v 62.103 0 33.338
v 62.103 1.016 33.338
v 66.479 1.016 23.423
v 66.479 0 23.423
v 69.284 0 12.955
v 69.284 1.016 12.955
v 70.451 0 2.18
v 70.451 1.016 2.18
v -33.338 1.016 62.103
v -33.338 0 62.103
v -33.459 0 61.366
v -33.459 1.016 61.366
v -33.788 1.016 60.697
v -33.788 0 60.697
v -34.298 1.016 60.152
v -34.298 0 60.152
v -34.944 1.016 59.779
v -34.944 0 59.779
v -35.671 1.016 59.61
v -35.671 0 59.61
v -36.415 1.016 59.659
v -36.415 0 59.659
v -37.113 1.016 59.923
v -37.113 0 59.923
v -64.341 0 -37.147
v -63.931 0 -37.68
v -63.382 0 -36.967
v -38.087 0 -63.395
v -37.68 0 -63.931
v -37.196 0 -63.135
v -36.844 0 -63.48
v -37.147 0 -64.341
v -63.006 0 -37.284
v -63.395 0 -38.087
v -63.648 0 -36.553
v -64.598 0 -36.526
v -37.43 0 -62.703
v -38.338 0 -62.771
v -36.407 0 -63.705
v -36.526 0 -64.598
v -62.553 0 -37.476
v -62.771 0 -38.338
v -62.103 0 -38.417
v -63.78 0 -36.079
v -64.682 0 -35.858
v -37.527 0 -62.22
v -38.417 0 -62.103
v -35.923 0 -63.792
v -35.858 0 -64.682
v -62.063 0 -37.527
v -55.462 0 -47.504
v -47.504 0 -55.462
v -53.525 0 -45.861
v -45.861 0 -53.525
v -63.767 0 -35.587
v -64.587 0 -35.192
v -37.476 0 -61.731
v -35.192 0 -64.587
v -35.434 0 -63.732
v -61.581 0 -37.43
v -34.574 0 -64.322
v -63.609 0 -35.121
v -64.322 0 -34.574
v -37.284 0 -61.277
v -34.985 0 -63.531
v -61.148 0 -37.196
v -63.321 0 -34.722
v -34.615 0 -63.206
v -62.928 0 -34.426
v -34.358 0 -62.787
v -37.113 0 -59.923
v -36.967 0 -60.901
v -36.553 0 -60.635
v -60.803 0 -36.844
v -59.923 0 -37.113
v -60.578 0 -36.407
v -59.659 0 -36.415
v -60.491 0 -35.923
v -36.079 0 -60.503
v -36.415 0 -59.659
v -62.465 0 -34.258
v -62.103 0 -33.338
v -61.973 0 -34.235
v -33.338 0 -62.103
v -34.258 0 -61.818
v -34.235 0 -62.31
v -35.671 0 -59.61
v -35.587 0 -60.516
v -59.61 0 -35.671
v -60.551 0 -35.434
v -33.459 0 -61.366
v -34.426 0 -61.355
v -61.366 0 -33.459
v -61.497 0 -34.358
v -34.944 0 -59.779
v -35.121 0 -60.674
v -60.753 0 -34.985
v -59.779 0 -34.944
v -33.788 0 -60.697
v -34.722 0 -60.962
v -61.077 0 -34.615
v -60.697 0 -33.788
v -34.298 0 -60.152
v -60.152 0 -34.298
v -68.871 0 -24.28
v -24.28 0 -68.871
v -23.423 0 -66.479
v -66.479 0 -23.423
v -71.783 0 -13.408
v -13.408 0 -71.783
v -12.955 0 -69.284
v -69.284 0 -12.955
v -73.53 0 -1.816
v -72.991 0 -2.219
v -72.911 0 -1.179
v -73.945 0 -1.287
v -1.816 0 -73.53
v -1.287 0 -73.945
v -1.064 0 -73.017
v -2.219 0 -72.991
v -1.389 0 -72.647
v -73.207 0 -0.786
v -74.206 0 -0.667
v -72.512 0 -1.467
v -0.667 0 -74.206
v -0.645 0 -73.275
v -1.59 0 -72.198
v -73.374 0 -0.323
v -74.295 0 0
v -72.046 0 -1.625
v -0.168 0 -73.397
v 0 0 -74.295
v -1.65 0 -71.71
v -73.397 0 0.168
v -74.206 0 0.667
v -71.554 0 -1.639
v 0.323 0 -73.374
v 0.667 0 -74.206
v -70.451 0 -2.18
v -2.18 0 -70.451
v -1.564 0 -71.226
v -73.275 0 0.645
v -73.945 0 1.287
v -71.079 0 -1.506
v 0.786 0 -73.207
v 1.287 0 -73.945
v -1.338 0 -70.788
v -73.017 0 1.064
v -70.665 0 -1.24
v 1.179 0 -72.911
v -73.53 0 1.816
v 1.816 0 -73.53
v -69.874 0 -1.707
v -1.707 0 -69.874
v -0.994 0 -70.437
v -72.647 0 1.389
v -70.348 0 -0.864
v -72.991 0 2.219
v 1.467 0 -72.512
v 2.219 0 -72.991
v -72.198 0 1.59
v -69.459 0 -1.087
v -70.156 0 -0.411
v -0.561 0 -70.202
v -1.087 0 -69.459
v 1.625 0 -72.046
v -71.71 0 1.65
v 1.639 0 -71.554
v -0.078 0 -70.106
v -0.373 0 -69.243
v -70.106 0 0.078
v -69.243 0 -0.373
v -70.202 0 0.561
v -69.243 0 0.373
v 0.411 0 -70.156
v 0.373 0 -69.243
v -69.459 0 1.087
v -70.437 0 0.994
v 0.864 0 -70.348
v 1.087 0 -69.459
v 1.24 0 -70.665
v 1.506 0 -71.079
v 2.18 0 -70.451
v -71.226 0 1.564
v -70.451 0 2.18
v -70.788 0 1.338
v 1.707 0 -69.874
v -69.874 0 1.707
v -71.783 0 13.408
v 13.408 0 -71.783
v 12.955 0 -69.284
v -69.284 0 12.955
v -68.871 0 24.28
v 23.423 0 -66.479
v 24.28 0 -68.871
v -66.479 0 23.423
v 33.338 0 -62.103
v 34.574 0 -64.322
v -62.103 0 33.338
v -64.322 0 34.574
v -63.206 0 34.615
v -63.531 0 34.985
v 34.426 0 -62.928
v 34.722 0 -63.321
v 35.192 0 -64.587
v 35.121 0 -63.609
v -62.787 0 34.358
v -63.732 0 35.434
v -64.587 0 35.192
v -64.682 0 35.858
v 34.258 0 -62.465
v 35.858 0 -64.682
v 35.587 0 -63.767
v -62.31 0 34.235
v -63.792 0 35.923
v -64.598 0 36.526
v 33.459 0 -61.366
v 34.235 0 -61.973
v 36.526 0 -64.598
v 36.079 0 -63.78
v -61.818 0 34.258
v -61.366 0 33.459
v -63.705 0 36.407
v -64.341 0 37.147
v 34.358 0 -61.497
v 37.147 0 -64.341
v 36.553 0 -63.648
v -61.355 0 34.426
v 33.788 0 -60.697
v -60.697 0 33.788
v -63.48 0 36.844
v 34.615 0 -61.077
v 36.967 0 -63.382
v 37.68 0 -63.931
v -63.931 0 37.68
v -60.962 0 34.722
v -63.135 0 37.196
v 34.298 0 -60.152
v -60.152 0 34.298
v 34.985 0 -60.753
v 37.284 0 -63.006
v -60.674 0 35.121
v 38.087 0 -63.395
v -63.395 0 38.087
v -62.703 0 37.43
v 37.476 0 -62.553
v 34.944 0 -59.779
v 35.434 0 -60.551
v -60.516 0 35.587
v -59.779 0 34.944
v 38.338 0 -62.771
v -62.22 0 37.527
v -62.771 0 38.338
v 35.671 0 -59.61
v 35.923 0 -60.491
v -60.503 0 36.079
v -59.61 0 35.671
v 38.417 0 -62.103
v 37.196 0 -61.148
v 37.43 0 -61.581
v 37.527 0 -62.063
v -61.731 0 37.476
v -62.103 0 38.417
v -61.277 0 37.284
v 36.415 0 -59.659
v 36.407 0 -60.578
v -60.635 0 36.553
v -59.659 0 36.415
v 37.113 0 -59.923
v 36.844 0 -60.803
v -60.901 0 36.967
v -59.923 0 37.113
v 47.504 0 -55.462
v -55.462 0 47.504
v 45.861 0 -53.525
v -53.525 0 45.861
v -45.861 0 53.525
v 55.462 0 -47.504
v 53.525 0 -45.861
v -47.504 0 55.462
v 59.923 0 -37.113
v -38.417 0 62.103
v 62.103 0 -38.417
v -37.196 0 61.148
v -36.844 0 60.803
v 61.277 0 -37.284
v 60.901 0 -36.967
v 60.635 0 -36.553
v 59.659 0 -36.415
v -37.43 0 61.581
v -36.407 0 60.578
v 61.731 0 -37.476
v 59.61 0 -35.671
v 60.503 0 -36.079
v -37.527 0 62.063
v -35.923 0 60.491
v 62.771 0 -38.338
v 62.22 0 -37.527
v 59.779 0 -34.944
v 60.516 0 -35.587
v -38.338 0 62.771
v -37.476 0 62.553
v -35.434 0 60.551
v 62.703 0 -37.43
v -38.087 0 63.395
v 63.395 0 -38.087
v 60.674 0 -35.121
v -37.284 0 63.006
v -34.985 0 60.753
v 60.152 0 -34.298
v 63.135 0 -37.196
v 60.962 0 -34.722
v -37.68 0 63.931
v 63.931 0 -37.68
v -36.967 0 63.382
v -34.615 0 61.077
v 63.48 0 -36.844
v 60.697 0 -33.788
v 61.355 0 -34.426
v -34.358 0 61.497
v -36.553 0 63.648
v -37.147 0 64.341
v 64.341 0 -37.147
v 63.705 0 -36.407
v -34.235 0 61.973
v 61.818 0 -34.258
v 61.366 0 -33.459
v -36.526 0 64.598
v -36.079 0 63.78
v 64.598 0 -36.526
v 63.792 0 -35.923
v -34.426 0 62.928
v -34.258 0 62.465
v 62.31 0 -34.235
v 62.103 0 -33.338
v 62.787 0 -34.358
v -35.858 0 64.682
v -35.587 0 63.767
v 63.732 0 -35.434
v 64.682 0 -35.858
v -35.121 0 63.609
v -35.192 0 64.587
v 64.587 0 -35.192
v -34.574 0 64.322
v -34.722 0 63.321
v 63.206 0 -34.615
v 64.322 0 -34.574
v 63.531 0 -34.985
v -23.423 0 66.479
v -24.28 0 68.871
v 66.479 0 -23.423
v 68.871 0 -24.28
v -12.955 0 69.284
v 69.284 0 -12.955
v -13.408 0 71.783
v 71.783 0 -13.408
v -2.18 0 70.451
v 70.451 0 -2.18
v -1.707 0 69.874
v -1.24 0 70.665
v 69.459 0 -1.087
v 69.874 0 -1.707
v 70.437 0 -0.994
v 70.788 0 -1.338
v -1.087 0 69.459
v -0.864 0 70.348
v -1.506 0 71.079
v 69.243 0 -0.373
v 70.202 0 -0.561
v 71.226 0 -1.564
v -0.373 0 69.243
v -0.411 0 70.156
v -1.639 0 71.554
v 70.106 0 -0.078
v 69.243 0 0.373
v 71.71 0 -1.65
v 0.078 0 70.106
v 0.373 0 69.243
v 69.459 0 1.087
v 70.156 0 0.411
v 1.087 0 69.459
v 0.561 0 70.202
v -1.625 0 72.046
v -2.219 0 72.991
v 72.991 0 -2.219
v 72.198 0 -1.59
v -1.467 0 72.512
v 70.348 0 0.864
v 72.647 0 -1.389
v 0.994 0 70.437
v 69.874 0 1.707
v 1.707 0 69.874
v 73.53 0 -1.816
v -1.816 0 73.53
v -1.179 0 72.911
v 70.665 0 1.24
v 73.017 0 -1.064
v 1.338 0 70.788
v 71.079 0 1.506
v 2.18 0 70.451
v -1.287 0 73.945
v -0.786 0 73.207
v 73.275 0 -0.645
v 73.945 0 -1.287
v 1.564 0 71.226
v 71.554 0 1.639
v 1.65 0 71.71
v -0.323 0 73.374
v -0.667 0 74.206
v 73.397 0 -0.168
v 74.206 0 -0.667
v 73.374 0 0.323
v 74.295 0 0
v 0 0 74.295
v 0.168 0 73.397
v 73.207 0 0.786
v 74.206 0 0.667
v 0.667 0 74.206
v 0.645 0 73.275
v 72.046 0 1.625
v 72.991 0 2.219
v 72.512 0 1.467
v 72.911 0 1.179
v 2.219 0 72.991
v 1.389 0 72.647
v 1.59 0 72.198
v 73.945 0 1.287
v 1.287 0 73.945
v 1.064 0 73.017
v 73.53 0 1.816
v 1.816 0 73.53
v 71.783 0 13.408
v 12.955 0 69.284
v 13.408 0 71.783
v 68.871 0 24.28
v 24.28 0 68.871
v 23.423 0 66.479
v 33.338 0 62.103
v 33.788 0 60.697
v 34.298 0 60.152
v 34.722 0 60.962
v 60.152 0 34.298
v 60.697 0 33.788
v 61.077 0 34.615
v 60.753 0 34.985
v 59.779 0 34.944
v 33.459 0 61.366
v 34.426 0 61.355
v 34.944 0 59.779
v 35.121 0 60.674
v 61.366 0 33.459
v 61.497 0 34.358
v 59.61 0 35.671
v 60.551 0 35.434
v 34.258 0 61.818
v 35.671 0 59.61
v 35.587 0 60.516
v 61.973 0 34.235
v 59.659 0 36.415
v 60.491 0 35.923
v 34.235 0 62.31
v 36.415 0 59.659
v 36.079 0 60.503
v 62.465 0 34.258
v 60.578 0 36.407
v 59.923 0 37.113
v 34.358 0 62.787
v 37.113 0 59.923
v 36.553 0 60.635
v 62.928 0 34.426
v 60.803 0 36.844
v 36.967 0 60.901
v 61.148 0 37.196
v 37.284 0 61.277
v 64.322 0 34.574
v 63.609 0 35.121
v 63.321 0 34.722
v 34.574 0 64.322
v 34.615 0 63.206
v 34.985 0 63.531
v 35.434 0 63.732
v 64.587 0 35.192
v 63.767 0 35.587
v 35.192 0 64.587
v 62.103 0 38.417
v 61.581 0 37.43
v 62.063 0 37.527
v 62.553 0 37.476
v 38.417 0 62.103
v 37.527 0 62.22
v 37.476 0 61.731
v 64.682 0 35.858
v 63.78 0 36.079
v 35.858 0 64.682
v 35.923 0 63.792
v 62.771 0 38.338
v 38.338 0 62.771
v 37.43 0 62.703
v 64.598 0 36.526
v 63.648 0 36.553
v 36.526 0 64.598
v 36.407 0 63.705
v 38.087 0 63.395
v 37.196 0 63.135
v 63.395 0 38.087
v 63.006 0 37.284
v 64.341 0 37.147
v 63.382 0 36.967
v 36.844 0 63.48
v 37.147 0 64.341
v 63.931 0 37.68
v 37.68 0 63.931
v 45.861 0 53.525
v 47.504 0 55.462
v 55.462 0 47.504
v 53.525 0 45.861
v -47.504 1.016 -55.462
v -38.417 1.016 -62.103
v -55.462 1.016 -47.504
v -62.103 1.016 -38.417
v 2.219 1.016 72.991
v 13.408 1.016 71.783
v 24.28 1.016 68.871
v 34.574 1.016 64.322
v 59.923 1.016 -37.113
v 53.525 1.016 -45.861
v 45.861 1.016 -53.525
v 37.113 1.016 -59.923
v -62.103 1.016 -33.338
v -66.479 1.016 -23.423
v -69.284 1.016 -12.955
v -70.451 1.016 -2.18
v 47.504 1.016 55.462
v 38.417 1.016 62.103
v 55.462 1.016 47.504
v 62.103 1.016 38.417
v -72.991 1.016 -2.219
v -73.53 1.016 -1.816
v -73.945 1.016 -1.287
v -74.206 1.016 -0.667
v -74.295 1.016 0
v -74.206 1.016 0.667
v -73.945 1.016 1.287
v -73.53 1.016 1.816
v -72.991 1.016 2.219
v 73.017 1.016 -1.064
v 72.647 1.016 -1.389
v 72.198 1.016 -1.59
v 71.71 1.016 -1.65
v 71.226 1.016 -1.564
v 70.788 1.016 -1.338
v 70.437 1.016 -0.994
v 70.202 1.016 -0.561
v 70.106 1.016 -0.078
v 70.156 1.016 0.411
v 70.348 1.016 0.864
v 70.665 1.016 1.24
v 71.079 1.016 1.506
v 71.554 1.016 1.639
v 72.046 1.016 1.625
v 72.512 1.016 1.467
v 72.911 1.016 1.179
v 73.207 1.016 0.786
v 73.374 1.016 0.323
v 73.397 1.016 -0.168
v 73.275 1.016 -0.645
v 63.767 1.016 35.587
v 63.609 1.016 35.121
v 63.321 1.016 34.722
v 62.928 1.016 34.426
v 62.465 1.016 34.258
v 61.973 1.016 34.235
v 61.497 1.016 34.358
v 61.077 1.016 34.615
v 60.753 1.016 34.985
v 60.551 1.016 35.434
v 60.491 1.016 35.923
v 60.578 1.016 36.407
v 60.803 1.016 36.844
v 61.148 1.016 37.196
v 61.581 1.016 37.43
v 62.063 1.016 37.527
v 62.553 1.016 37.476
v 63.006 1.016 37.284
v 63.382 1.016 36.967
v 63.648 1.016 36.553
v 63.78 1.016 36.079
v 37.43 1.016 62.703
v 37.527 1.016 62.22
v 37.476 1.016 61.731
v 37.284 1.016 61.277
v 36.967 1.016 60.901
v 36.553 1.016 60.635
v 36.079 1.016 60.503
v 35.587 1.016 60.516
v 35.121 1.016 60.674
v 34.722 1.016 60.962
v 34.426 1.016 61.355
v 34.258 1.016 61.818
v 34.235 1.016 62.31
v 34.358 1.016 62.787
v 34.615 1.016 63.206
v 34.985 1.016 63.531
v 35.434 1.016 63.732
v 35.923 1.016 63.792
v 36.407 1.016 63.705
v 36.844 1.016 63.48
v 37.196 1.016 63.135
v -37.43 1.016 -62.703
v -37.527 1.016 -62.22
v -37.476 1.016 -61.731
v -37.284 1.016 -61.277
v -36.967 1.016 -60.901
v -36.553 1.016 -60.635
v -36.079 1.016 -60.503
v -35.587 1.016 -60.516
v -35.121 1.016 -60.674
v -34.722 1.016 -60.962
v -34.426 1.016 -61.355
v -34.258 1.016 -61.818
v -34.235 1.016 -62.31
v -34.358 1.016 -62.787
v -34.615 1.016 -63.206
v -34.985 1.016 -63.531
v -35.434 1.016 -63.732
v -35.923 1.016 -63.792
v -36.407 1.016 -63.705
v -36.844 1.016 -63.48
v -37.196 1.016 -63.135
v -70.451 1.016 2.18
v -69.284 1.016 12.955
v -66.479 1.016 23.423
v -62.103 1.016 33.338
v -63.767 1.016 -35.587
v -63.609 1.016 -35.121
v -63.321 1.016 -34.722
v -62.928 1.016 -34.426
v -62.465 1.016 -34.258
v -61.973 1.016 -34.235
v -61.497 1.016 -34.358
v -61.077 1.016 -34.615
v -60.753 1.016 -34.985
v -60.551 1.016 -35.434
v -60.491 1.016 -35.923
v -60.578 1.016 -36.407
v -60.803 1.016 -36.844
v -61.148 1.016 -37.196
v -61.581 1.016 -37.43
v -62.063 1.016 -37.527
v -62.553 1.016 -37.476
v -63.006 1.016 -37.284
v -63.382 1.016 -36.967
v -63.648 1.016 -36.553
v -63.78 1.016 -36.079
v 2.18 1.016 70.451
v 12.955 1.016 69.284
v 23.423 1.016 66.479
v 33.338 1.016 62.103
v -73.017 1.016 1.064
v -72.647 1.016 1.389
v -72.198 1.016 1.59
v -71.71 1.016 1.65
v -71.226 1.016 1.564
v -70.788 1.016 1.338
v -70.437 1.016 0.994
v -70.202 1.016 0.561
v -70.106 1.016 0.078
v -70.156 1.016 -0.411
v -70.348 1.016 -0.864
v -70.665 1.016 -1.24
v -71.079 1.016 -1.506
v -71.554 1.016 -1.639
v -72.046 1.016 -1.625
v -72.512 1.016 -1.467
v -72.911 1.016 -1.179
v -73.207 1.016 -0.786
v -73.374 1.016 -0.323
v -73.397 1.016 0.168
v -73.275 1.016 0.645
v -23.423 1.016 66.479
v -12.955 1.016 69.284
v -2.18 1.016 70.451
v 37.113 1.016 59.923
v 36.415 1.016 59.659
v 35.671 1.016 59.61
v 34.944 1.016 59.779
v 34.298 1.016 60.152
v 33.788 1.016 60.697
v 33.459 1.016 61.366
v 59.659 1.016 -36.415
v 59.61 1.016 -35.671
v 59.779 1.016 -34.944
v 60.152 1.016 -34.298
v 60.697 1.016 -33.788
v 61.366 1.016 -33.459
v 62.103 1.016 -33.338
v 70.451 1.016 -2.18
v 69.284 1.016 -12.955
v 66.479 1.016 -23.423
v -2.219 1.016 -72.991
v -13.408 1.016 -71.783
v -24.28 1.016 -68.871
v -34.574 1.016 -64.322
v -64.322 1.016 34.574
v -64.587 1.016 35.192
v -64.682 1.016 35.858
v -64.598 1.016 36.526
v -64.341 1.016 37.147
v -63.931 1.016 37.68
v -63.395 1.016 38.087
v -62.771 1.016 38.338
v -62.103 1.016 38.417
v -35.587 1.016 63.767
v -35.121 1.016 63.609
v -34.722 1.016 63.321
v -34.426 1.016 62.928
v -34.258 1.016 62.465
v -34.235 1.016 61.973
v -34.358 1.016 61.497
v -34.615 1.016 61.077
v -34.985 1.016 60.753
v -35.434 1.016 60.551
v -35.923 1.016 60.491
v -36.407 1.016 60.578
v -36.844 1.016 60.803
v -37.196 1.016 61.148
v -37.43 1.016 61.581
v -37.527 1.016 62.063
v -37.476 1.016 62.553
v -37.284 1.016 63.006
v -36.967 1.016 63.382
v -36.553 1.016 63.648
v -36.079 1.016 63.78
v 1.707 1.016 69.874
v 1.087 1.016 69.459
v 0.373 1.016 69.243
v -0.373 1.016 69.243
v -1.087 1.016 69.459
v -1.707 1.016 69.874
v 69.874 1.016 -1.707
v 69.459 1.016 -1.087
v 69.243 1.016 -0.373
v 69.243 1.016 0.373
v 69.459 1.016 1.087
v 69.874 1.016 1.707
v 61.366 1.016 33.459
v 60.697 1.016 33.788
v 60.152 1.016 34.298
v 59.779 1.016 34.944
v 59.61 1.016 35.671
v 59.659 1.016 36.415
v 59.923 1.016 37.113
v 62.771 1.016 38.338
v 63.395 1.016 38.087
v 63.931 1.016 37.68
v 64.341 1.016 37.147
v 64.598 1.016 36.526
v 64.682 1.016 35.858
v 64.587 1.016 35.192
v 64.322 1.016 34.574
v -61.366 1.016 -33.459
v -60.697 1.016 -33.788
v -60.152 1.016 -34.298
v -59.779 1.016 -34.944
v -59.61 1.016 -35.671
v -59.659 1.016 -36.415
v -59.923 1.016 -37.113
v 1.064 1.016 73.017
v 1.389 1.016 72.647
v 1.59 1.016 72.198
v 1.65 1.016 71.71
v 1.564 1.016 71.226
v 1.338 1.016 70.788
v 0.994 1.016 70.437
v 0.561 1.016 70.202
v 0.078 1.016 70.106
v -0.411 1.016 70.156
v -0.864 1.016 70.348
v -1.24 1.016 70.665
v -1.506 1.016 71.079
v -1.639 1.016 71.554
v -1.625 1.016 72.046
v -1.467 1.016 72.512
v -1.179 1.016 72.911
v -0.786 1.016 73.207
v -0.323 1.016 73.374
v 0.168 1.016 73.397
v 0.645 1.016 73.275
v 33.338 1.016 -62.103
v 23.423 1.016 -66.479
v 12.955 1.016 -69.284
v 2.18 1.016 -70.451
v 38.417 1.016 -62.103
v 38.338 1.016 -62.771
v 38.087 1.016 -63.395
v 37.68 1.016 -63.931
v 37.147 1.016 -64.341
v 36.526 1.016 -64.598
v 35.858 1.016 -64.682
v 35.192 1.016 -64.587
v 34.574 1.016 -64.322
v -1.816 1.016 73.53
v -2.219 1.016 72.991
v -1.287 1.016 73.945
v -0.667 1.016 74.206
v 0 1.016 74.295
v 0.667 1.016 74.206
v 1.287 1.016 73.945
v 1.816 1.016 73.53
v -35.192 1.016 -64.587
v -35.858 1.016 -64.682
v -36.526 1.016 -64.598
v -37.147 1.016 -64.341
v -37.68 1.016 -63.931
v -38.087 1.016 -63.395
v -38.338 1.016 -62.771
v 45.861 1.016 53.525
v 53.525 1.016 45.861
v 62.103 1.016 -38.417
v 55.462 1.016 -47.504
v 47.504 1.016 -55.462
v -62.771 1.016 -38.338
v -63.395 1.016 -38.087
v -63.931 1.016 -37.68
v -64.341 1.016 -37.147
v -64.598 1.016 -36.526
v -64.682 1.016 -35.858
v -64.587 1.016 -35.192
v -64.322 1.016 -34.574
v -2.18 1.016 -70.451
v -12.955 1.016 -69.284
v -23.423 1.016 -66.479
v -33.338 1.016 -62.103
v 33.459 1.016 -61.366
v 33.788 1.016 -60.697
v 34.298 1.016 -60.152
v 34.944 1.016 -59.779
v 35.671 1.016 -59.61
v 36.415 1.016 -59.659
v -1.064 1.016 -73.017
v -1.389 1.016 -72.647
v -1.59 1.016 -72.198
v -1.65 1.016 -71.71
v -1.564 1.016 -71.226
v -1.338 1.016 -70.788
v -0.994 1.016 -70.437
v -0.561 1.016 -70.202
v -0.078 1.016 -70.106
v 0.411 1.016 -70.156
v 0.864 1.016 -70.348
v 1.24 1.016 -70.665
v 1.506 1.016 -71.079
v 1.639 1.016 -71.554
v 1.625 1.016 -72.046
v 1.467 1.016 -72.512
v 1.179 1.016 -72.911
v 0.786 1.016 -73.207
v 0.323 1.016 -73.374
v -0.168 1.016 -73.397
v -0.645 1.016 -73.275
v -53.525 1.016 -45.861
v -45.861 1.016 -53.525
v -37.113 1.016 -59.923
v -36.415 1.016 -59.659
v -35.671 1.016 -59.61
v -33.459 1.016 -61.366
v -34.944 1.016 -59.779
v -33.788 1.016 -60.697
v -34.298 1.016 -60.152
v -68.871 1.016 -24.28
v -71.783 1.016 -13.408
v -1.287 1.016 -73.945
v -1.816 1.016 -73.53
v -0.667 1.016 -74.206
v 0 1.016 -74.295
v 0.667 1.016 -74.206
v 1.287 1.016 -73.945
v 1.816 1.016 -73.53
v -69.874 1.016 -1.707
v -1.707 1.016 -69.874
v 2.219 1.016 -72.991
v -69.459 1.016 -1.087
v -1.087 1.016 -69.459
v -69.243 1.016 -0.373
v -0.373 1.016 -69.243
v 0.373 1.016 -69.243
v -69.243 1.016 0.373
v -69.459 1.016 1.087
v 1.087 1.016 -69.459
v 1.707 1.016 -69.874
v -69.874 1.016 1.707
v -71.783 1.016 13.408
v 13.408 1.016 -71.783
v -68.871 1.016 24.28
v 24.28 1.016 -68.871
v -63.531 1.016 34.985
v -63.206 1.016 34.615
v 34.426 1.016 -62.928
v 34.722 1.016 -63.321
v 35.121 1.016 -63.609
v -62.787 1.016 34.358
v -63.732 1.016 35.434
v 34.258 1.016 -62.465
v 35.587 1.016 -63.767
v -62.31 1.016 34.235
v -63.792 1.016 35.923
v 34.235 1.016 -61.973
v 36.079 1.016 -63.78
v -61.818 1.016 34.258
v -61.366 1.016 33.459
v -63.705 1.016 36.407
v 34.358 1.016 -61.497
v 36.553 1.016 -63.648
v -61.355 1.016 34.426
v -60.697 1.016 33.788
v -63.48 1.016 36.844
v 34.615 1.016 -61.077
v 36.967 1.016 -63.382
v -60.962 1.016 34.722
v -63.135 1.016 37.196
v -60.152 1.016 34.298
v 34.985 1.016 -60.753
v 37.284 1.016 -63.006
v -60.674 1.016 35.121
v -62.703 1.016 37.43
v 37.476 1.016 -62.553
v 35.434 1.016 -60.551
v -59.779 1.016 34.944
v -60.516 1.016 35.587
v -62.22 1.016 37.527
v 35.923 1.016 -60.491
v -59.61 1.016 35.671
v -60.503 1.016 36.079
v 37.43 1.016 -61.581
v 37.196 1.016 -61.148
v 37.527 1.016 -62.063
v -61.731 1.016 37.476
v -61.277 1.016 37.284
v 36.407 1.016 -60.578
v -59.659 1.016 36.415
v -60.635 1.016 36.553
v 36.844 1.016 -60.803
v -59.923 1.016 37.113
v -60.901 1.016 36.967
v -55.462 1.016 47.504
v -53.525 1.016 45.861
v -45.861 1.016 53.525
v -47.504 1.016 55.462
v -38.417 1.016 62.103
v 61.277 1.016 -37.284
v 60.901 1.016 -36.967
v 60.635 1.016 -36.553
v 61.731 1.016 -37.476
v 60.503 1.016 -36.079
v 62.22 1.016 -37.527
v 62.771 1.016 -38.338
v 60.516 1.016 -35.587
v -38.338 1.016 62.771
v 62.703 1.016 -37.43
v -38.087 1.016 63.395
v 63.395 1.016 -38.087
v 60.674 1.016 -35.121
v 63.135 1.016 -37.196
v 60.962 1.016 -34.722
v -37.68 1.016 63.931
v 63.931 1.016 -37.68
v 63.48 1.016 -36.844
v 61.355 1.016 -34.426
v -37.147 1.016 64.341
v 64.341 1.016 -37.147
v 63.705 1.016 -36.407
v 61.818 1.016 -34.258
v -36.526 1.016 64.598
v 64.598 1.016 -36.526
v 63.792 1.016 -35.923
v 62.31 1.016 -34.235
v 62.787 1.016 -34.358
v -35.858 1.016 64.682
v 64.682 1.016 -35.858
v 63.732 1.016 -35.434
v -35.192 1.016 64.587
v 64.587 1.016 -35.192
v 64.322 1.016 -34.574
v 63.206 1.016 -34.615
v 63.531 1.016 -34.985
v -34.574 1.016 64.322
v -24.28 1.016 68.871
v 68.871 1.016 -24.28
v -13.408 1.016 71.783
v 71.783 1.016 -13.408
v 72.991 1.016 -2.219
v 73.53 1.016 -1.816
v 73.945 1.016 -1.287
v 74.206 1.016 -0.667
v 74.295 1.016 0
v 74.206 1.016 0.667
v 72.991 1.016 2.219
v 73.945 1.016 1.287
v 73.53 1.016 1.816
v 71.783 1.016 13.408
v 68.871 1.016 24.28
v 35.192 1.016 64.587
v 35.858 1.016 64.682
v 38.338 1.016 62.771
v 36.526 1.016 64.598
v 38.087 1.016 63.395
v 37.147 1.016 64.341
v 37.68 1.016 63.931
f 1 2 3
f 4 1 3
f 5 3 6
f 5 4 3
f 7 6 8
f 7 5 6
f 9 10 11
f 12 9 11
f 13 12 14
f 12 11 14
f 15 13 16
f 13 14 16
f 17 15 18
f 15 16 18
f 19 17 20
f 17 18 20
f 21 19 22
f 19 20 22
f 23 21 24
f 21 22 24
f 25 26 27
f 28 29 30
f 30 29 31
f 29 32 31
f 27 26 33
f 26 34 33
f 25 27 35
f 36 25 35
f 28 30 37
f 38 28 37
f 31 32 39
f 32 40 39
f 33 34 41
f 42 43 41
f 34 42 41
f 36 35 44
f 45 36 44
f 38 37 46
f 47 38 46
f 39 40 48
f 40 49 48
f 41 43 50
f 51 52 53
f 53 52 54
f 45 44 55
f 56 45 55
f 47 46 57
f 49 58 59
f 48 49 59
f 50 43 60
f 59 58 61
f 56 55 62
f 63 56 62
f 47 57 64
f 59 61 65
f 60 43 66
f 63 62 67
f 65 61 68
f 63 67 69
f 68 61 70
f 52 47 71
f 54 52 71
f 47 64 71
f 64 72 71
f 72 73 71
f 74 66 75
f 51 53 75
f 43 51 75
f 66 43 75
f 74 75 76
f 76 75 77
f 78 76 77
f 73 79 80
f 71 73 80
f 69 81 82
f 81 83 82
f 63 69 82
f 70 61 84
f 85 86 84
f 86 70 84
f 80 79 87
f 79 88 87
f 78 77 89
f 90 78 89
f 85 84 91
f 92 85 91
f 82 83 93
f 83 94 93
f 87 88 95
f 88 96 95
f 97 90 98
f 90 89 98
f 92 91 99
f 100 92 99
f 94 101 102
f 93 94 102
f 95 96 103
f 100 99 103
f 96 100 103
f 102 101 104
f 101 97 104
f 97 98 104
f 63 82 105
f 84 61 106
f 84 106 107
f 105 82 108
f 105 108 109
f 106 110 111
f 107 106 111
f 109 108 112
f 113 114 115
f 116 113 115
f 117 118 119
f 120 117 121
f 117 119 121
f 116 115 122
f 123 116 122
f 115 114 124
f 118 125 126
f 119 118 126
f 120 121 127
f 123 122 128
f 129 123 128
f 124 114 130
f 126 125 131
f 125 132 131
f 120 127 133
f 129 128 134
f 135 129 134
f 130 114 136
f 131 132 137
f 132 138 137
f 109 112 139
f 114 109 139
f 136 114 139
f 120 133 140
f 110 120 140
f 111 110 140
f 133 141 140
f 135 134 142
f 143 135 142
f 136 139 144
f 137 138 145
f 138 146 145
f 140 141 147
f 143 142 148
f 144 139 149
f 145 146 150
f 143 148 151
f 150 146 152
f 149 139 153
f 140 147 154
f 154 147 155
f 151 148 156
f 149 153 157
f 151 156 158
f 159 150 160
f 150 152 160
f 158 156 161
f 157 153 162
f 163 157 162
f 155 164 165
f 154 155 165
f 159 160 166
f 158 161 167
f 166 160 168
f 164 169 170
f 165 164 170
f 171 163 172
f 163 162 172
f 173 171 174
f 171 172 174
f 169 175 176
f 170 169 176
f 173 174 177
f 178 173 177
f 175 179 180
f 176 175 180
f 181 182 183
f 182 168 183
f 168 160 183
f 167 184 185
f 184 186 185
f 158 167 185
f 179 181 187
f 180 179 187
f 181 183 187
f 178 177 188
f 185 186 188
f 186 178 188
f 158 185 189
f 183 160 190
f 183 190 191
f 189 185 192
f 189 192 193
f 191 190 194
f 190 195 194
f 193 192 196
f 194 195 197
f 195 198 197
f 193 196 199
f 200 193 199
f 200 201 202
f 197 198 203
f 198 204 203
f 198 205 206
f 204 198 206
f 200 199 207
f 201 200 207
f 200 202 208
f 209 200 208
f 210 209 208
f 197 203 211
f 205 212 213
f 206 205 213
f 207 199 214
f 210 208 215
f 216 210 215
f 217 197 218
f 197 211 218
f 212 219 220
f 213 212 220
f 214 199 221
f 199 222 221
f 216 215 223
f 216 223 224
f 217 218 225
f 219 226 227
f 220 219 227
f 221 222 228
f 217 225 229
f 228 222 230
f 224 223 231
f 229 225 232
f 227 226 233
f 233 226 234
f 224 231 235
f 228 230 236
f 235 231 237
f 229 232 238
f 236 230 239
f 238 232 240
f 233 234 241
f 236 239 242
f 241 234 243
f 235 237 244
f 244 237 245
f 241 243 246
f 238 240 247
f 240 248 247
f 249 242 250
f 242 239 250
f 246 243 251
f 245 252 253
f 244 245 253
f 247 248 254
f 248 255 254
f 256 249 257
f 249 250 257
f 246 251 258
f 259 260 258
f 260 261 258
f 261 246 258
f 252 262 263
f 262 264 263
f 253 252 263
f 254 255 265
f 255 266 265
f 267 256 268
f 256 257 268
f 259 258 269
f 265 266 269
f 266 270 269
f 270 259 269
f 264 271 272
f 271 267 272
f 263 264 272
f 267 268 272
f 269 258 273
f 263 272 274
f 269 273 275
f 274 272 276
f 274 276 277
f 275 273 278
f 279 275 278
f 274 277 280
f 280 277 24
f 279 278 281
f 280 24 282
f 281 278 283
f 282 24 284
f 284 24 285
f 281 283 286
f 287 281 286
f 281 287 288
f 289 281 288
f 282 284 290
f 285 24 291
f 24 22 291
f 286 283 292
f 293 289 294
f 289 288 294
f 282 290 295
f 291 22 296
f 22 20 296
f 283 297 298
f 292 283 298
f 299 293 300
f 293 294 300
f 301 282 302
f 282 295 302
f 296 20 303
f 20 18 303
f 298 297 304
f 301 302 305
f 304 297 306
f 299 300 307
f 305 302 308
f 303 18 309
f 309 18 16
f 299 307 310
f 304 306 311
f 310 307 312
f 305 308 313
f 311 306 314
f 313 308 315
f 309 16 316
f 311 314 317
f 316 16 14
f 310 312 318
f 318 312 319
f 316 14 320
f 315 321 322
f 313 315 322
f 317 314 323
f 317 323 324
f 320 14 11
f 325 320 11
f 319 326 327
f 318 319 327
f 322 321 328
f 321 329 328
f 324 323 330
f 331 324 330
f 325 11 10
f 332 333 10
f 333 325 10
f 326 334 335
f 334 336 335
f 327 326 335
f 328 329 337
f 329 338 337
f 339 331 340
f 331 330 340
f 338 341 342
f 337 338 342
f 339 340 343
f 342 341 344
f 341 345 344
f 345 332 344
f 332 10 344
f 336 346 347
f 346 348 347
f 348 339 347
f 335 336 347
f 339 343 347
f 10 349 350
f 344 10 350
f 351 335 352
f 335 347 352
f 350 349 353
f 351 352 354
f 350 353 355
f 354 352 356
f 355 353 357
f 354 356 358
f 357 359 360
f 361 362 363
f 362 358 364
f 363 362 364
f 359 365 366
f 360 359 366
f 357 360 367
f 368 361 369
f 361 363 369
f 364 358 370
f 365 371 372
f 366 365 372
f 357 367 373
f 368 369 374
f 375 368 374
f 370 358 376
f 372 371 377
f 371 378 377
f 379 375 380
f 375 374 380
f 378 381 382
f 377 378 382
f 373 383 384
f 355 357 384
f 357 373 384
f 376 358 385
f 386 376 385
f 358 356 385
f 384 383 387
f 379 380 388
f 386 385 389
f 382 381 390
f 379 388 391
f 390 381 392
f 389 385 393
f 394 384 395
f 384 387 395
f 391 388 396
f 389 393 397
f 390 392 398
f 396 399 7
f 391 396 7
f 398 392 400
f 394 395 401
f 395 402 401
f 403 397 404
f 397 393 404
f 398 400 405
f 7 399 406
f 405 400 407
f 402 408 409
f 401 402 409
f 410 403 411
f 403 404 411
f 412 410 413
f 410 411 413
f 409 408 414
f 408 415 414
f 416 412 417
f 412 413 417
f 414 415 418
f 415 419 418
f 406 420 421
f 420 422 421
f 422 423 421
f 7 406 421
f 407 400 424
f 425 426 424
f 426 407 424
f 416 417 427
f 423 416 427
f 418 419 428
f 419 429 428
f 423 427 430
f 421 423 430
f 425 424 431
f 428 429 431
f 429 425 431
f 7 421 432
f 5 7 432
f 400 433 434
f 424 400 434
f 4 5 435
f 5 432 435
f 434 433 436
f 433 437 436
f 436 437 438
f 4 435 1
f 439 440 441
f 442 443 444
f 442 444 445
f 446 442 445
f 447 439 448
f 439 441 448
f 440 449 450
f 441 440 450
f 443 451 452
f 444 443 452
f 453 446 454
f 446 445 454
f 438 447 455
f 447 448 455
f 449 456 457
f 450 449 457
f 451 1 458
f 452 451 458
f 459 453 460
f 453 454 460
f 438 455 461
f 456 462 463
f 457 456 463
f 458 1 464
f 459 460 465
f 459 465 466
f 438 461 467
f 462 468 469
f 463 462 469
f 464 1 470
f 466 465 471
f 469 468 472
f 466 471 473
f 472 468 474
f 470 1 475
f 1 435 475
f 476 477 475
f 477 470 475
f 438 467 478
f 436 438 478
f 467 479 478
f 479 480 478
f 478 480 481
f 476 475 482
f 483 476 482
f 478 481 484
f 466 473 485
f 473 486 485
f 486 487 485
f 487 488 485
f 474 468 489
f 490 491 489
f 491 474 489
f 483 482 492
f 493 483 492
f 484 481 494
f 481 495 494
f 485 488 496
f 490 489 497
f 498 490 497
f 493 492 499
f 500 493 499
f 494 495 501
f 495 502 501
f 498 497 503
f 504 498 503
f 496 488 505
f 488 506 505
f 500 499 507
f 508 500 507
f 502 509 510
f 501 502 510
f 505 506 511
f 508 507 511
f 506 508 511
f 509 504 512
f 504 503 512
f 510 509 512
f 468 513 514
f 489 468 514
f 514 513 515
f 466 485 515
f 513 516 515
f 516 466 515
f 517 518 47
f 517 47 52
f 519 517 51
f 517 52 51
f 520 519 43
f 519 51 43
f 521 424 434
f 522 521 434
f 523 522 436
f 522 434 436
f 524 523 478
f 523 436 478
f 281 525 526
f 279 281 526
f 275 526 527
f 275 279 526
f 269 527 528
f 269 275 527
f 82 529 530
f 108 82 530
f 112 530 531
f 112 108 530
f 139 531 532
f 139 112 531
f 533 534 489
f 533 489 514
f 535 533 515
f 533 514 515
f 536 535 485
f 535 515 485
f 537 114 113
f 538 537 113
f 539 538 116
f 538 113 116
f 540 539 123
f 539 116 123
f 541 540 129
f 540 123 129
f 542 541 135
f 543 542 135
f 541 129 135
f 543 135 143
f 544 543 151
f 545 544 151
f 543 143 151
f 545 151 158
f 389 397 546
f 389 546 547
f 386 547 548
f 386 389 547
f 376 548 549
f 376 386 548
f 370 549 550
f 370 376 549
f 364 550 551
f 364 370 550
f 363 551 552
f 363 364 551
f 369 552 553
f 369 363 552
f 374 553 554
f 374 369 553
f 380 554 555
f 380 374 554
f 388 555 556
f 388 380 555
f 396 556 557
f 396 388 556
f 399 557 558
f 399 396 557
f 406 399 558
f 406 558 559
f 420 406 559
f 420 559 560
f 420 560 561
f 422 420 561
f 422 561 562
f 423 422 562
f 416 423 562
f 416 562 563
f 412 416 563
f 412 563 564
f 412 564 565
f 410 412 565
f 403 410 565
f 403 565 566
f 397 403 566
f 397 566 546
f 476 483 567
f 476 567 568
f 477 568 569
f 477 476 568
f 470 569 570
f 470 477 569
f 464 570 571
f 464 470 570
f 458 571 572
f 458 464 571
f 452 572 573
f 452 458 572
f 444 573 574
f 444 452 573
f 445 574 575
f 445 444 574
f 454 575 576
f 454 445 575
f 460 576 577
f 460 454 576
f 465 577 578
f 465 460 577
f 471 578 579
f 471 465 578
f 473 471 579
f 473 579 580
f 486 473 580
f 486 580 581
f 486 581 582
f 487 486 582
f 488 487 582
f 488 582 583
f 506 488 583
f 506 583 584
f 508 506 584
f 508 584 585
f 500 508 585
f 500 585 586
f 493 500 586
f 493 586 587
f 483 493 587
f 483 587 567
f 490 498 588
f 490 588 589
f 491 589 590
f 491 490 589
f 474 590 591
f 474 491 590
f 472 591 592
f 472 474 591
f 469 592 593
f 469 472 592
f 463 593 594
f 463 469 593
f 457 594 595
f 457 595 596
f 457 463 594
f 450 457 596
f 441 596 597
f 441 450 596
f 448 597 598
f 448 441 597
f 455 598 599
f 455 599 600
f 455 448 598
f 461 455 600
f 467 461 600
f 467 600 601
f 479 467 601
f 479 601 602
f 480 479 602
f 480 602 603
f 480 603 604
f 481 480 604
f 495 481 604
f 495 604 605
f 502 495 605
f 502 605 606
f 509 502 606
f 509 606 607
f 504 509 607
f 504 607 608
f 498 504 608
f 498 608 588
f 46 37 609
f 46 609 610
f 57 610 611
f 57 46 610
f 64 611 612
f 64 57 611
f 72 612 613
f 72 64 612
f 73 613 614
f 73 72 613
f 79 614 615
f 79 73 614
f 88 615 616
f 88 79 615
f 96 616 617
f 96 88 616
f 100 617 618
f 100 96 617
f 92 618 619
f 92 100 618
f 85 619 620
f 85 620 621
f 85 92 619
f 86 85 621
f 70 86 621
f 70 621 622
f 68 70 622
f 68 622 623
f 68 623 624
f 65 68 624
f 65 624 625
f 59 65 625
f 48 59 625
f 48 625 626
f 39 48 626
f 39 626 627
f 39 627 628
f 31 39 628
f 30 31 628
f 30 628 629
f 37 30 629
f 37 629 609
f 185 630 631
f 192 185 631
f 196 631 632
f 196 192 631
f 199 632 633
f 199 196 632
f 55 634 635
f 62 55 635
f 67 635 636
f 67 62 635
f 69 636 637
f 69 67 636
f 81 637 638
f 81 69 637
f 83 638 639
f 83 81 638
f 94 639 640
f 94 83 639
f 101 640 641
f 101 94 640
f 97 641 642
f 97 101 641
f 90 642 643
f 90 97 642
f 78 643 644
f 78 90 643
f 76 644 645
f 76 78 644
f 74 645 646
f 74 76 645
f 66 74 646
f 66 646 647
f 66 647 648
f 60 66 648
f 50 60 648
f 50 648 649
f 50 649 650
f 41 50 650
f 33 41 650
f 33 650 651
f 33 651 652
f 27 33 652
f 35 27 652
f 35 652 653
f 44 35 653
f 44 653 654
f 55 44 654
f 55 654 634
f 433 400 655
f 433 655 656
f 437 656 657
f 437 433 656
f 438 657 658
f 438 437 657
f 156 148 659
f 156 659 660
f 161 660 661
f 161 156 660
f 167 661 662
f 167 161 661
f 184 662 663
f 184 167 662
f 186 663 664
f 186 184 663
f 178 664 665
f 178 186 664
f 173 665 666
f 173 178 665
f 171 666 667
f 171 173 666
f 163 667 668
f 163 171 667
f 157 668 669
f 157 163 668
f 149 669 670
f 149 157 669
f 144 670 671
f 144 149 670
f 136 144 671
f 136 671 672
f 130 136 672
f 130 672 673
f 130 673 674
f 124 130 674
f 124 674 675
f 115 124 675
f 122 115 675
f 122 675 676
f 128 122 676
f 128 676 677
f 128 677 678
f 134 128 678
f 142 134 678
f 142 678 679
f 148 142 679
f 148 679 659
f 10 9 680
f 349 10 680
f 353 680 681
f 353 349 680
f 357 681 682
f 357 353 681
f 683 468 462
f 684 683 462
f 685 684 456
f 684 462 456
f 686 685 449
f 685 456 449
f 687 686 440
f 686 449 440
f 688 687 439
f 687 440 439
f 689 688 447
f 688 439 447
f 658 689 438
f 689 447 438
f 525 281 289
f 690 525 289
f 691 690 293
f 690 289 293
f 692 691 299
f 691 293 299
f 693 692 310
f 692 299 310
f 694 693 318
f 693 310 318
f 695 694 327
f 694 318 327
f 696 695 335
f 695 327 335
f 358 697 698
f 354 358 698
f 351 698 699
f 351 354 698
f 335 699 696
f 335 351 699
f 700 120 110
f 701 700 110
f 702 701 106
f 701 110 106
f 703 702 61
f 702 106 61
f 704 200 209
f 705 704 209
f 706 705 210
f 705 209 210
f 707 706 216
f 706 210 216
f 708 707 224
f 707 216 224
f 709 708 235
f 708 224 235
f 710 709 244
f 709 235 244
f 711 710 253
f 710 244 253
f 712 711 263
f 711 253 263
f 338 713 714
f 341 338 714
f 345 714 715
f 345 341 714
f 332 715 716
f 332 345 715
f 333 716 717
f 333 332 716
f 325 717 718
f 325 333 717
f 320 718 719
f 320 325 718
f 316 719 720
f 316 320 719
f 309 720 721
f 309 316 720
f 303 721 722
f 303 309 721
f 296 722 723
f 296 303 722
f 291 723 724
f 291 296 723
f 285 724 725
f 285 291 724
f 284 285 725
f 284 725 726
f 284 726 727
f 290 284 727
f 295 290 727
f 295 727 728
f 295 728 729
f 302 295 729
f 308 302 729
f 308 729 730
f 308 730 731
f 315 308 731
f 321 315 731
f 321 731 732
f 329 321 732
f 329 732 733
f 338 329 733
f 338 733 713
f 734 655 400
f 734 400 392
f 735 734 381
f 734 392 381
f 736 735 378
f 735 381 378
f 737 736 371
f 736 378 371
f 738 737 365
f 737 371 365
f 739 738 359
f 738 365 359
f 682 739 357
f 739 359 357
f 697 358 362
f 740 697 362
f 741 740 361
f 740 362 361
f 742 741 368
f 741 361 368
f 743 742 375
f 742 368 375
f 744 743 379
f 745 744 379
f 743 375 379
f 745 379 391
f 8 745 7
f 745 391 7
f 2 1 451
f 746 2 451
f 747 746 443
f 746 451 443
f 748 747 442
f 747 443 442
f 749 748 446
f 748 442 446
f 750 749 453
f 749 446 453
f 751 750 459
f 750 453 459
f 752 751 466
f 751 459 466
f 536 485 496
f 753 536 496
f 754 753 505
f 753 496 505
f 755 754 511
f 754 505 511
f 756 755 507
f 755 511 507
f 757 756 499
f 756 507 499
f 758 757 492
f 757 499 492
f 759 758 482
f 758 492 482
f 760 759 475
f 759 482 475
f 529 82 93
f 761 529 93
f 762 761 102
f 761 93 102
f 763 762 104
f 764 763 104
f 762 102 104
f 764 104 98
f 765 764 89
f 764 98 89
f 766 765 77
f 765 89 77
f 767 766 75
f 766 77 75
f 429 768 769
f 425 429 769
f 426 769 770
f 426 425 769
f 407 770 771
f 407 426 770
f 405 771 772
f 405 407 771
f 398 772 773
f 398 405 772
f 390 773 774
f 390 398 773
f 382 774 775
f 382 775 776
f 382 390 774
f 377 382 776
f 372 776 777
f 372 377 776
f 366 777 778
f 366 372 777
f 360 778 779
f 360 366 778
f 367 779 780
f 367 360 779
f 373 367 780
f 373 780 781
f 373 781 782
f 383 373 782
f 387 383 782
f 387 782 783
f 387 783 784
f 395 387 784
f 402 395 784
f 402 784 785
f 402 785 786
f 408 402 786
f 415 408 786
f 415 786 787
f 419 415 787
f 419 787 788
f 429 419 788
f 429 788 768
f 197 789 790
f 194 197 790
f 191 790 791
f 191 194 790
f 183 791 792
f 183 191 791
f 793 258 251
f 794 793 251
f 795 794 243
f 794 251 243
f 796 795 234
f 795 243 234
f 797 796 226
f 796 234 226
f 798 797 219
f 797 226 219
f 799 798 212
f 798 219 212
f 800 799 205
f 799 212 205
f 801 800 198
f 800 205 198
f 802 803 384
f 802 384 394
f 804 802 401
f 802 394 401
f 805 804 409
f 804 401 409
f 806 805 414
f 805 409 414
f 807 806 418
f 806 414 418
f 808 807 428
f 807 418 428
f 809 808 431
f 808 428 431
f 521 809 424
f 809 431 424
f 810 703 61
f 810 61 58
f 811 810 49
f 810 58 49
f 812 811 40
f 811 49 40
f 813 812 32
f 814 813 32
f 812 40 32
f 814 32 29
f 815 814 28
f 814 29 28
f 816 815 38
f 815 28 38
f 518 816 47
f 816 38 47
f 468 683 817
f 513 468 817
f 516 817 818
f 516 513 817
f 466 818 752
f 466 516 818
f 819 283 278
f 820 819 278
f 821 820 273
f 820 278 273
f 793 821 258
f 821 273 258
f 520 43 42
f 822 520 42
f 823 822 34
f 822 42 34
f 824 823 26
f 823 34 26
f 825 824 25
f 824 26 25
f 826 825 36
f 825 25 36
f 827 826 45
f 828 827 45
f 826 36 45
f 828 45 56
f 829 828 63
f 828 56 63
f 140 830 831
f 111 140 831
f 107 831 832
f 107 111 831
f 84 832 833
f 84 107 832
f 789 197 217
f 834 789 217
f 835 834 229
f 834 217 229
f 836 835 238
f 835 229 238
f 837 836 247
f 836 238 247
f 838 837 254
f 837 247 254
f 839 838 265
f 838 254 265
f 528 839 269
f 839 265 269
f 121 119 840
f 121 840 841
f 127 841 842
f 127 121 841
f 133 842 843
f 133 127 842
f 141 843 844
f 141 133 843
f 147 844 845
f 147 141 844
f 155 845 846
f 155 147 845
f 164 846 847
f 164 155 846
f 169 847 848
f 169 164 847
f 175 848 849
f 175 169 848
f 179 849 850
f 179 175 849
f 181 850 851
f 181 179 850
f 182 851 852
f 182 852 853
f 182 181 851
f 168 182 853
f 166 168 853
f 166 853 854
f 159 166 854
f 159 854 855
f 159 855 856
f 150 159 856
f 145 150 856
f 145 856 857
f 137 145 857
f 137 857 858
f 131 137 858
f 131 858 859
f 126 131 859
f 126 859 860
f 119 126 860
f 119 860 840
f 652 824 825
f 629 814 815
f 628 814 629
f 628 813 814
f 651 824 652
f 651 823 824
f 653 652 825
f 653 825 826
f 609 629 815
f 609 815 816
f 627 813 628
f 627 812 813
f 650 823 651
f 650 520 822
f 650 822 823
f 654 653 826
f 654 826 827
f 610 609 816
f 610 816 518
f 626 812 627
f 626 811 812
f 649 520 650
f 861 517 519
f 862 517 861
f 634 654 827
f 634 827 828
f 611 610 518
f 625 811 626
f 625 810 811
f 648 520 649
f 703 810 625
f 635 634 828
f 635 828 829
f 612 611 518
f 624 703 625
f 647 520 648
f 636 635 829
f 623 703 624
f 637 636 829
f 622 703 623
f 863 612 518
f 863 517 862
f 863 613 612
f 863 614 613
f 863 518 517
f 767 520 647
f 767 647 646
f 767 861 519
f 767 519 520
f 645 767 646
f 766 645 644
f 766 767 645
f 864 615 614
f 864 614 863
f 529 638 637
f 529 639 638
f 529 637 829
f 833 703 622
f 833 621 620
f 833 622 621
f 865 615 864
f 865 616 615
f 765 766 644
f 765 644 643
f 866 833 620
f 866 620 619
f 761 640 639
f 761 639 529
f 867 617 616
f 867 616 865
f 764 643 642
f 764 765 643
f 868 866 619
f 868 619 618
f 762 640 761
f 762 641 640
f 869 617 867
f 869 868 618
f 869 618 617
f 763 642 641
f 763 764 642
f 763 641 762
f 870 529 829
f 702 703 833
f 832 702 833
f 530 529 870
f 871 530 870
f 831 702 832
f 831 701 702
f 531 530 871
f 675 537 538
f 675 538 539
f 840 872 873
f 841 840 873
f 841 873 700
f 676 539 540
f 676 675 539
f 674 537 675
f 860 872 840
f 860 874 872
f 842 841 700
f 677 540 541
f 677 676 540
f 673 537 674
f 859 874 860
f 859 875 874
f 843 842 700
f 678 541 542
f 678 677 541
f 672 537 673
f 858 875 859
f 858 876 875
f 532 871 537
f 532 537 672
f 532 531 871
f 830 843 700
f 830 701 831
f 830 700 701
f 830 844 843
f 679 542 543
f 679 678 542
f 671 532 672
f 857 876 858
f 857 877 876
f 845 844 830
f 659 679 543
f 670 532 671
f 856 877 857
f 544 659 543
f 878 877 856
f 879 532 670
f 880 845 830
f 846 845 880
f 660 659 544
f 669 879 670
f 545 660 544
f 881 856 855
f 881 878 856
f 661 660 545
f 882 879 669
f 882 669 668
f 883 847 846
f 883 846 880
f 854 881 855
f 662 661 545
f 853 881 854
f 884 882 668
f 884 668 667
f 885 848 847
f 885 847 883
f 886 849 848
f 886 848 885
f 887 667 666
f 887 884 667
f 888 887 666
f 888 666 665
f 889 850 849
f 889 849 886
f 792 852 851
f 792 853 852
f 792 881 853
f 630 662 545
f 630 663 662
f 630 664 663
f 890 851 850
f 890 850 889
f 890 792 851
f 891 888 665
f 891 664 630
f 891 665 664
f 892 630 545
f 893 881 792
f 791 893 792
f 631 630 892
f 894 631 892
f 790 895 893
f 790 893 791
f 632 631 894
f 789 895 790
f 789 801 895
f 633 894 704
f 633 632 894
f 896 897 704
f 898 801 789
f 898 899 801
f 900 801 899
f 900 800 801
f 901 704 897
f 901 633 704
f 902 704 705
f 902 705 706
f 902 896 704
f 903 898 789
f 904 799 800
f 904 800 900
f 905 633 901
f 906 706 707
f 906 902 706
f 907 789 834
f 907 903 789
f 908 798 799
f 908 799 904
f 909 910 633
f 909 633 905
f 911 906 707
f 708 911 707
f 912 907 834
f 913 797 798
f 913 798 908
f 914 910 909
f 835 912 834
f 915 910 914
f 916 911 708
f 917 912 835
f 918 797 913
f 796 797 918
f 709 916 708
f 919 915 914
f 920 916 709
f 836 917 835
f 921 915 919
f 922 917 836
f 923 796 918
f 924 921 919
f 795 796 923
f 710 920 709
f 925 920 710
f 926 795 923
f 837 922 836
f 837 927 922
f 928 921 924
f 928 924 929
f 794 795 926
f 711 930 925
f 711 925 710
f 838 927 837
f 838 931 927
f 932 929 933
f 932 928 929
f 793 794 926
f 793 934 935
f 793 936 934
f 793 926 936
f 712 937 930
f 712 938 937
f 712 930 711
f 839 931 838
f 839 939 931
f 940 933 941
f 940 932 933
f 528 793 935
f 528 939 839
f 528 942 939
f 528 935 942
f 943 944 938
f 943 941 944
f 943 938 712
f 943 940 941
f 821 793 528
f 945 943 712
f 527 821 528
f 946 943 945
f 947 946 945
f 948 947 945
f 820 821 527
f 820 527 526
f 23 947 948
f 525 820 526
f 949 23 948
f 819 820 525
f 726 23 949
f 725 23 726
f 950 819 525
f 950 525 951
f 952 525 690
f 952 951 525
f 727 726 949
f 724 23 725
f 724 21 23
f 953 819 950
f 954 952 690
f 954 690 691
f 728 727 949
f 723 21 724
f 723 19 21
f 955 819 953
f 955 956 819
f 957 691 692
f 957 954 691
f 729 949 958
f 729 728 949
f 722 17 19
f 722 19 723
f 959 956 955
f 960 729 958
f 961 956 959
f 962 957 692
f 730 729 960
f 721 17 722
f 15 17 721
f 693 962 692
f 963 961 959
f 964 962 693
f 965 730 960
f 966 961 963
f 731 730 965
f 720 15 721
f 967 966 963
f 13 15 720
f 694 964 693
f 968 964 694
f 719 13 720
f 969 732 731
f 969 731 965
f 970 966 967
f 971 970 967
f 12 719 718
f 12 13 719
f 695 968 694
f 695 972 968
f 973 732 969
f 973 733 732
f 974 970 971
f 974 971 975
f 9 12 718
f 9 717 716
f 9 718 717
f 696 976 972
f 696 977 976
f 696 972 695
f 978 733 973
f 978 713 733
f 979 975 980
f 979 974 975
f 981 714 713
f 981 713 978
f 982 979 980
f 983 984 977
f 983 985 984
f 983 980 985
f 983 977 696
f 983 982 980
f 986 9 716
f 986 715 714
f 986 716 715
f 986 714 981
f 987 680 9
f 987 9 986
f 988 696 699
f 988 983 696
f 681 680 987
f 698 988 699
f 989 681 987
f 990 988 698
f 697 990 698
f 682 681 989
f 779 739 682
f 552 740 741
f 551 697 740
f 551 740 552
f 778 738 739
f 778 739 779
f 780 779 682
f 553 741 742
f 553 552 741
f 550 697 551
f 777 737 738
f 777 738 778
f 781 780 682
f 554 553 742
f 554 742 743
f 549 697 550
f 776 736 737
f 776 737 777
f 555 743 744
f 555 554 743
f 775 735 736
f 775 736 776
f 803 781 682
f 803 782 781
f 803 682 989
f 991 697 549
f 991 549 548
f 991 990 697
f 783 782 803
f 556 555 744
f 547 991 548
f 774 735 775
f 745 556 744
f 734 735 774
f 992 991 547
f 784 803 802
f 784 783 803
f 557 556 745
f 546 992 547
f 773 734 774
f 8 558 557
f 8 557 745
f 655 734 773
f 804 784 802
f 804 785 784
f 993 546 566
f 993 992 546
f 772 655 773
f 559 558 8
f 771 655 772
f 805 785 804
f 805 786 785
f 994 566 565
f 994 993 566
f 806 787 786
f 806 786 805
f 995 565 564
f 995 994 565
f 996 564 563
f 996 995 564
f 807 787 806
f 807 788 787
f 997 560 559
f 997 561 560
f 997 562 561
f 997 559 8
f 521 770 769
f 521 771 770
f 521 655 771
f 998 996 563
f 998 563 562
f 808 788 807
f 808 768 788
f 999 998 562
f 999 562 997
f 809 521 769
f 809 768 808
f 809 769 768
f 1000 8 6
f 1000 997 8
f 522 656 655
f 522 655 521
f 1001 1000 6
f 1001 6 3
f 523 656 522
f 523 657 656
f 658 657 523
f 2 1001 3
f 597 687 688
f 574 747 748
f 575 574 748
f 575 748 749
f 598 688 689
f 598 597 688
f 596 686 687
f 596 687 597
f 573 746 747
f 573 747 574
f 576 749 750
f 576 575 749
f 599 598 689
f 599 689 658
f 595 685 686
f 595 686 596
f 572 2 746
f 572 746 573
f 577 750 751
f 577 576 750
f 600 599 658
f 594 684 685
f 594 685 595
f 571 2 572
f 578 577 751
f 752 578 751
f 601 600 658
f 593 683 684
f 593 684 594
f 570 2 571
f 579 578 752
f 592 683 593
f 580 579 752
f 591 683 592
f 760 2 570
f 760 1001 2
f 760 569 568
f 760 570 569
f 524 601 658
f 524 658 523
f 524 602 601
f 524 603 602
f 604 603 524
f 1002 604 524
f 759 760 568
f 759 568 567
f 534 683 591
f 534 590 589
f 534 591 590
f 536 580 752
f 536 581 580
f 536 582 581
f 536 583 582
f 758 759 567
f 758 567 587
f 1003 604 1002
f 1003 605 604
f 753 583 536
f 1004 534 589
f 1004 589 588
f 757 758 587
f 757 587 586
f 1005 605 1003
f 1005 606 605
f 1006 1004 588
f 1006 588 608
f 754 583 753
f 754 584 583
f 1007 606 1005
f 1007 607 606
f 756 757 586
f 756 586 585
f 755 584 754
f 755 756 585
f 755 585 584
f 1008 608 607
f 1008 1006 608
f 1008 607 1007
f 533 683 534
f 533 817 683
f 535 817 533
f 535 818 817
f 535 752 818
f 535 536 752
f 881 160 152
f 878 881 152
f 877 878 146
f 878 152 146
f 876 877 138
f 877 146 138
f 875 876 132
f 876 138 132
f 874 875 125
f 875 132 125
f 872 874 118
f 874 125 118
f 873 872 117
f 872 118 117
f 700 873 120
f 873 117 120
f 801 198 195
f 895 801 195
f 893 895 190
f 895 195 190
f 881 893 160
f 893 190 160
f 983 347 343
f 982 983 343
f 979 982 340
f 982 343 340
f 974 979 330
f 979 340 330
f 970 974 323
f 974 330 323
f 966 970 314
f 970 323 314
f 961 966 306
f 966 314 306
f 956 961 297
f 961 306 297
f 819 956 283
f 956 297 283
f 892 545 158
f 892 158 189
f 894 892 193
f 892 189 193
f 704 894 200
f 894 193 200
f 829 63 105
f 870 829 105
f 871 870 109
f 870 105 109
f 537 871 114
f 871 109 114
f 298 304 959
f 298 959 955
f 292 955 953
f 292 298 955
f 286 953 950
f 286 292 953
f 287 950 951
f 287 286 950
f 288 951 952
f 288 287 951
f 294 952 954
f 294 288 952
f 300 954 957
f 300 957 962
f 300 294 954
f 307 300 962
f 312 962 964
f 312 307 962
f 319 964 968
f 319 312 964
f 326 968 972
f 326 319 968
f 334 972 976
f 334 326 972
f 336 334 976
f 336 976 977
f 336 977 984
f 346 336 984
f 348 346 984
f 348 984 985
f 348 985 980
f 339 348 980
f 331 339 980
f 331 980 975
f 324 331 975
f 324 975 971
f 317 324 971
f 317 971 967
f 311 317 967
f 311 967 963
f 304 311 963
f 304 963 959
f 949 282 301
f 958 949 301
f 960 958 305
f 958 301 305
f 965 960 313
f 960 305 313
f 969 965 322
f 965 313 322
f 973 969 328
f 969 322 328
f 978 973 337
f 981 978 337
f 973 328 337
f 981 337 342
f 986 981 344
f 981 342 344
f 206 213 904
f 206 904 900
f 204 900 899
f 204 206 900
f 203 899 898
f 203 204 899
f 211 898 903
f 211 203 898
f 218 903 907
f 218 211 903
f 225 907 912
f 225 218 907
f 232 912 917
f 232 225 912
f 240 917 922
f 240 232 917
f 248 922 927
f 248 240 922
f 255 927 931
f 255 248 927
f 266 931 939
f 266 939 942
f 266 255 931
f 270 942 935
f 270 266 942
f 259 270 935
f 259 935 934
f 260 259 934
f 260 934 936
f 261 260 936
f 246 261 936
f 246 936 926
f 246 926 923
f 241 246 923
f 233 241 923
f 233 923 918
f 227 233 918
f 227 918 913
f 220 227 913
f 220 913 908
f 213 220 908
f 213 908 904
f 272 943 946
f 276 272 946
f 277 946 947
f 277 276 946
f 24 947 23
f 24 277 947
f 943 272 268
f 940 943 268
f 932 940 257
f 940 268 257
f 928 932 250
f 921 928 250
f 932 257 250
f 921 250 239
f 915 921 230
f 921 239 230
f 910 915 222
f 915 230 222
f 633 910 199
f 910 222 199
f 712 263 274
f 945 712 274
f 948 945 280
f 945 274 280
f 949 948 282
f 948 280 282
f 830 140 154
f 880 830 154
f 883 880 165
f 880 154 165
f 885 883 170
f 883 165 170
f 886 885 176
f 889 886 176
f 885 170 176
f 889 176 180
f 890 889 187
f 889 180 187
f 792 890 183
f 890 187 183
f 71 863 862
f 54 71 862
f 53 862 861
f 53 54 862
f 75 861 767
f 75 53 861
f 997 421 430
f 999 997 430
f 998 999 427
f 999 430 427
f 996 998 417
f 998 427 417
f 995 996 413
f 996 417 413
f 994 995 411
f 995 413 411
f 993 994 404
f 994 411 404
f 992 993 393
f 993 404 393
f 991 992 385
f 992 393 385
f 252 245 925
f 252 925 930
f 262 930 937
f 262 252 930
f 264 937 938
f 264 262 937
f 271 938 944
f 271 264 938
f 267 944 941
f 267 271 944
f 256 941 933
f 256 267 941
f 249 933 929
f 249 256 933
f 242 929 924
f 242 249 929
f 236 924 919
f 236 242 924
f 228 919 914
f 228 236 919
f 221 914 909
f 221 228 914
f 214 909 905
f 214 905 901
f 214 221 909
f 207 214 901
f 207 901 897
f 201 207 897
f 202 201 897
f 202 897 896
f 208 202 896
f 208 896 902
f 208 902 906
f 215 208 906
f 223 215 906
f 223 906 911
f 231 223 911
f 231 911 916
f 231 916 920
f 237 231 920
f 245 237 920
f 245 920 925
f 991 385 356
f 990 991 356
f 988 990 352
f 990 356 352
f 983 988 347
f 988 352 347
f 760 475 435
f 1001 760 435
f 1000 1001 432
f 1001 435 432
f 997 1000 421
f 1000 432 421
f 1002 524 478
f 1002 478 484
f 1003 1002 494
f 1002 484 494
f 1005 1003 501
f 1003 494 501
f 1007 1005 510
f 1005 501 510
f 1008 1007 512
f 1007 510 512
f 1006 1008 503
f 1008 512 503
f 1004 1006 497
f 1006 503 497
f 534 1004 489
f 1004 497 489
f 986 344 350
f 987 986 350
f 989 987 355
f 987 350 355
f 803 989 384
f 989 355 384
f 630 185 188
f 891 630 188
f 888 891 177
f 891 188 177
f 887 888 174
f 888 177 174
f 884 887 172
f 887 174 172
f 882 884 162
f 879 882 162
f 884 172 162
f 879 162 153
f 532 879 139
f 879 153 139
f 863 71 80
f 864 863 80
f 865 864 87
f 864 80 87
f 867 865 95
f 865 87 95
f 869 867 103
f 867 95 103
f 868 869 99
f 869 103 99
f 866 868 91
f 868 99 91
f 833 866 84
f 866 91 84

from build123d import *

# Parameters (mm, degrees)
SKETCH1_R           = 73.025
SKETCH1_R_2         = 70.485
BOSS_EXTRUDE1_DEPTH = 1.016
SKETCH1_3_R         = 2.54
SKETCH1_3_R_2       = 1.651
BOSS_EXTRUDE2_DEPTH = 1.016
SKETCH1_4_R         = 1.651
CUT_EXTRUDE1_DEPTH  = 1.016
CIRPATTERN2_COUNT   = 12


with BuildPart() as part:
    # Sketch1 → Boss-Extrude1 (new body)
    with BuildSketch(Plane(origin=(0, 0, 0), x_dir=(1, 0, 0), z_dir=(0, 1, 0))):
        with Locations(Location((0, 0, 0), (0, 0, 270))):
            Circle(SKETCH1_R)
        with Locations(Location((0, 0, 0), (0, 0, 270))):
            Circle(SKETCH1_R_2, mode=Mode.SUBTRACT)
    extrude(amount=BOSS_EXTRUDE1_DEPTH)

    # Sketch1<3> → Boss-Extrude2 (add)
    with BuildSketch(Plane(origin=(0, 0, 0), x_dir=(1, 0, 0), z_dir=(0, 1, 0))):
        with Locations((0, -71.755)):
            Circle(SKETCH1_3_R)
        with Locations((0, -71.755)):
            Circle(SKETCH1_3_R_2, mode=Mode.SUBTRACT)
    boss_extrude2 = extrude(amount=BOSS_EXTRUDE2_DEPTH)

    # Sketch1<4> → Cut-Extrude1 (cut)
    with BuildSketch(Plane(origin=(0, 0, 0), x_dir=(1, 0, 0), z_dir=(0, 1, 0))):
        with Locations(Location((0, -71.755, 0), (0, 0, 270))):
            Circle(SKETCH1_4_R)
    cut_extrude1 = extrude(amount=CUT_EXTRUDE1_DEPTH, mode=Mode.SUBTRACT)

    # CirPattern2: Boss-Extrude2, Cut-Extrude1 ×12 about axis
    cirpattern2_axis = Axis((0, 0, 0), (0, 1, 0))
    add([boss_extrude2.rotate(cirpattern2_axis, i * 360 / CIRPATTERN2_COUNT) for i in range(1, CIRPATTERN2_COUNT)])
    add([cut_extrude1.rotate(cirpattern2_axis, i * 360 / CIRPATTERN2_COUNT) for i in range(1, CIRPATTERN2_COUNT)], mode=Mode.SUBTRACT)


solid = part.part
